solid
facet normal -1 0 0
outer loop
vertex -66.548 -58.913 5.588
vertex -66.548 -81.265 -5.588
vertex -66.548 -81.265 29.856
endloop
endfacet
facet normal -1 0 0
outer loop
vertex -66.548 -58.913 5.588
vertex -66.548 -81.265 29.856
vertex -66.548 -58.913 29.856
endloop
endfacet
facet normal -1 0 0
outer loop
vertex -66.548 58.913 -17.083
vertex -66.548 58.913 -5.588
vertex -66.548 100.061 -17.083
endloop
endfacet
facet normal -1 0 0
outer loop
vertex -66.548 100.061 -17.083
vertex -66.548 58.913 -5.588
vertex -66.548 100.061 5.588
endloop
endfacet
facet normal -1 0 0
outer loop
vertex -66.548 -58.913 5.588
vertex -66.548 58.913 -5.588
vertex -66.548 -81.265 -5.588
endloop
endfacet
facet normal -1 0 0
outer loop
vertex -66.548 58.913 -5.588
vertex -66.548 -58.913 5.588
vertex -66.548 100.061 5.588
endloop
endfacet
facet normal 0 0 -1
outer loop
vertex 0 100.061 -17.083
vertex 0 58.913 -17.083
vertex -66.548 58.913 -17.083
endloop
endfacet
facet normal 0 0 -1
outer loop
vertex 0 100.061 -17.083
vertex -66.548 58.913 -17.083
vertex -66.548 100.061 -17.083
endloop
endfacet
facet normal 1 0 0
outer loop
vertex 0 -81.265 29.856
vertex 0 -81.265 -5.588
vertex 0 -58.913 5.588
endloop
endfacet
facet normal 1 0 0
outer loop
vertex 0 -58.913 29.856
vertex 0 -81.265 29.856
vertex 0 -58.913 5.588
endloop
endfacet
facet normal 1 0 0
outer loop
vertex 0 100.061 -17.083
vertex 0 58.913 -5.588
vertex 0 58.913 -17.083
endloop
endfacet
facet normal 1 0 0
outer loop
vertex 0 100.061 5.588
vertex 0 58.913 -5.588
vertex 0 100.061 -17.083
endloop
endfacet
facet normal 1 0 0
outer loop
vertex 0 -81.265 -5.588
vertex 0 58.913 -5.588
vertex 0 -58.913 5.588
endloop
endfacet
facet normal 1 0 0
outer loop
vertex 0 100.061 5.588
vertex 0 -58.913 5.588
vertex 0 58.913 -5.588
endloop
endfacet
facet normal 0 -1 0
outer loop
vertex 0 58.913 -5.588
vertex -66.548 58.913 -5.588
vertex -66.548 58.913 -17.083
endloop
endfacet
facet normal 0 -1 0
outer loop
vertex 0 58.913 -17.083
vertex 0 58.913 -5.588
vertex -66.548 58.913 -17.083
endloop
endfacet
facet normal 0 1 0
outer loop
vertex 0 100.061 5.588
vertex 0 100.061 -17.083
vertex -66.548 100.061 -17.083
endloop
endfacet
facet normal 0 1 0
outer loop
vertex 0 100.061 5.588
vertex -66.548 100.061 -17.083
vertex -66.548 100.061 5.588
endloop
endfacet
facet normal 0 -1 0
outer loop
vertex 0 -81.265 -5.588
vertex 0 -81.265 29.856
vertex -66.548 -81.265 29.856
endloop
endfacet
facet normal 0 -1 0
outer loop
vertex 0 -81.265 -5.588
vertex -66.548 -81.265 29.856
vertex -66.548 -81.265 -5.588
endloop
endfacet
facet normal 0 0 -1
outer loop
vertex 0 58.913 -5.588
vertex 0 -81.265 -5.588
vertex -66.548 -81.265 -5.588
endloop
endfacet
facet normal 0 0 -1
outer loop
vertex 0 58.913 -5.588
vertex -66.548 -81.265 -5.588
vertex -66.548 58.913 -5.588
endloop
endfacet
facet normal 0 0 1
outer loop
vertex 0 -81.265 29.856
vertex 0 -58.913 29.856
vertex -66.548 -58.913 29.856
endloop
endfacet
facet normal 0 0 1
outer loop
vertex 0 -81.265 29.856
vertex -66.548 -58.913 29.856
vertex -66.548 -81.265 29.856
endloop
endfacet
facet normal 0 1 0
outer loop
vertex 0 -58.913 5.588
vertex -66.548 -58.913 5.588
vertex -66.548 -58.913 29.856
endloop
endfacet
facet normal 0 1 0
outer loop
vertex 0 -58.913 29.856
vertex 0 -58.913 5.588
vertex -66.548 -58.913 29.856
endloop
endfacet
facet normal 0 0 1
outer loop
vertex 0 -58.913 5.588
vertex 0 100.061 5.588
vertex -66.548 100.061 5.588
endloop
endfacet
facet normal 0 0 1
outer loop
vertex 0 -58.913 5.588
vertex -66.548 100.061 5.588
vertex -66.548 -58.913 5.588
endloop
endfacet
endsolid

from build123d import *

# Parameters (mm, degrees)
F1_DEPTH = 66.548


with BuildPart() as f1:
    # F0 (on Right) → F1 (new body)
    with BuildSketch(Plane.YZ):
        Polygon((0, -5.588), (0, 5.588), (-58.913485, 5.588), (-58.913485, 29.855885), (-81.265485, 29.855885), (-81.265485, 5.588), (-81.265485, -5.588), (-58.913485, -5.588), align=None)
        Polygon((100.061485, 5.588), (58.913485, 5.588), (0, 5.588), (0, -5.588), (58.913485, -5.588), (58.913485, -17.083315), (100.061485, -17.083315), align=None)
    extrude(amount=-F1_DEPTH)


solid = f1.part
